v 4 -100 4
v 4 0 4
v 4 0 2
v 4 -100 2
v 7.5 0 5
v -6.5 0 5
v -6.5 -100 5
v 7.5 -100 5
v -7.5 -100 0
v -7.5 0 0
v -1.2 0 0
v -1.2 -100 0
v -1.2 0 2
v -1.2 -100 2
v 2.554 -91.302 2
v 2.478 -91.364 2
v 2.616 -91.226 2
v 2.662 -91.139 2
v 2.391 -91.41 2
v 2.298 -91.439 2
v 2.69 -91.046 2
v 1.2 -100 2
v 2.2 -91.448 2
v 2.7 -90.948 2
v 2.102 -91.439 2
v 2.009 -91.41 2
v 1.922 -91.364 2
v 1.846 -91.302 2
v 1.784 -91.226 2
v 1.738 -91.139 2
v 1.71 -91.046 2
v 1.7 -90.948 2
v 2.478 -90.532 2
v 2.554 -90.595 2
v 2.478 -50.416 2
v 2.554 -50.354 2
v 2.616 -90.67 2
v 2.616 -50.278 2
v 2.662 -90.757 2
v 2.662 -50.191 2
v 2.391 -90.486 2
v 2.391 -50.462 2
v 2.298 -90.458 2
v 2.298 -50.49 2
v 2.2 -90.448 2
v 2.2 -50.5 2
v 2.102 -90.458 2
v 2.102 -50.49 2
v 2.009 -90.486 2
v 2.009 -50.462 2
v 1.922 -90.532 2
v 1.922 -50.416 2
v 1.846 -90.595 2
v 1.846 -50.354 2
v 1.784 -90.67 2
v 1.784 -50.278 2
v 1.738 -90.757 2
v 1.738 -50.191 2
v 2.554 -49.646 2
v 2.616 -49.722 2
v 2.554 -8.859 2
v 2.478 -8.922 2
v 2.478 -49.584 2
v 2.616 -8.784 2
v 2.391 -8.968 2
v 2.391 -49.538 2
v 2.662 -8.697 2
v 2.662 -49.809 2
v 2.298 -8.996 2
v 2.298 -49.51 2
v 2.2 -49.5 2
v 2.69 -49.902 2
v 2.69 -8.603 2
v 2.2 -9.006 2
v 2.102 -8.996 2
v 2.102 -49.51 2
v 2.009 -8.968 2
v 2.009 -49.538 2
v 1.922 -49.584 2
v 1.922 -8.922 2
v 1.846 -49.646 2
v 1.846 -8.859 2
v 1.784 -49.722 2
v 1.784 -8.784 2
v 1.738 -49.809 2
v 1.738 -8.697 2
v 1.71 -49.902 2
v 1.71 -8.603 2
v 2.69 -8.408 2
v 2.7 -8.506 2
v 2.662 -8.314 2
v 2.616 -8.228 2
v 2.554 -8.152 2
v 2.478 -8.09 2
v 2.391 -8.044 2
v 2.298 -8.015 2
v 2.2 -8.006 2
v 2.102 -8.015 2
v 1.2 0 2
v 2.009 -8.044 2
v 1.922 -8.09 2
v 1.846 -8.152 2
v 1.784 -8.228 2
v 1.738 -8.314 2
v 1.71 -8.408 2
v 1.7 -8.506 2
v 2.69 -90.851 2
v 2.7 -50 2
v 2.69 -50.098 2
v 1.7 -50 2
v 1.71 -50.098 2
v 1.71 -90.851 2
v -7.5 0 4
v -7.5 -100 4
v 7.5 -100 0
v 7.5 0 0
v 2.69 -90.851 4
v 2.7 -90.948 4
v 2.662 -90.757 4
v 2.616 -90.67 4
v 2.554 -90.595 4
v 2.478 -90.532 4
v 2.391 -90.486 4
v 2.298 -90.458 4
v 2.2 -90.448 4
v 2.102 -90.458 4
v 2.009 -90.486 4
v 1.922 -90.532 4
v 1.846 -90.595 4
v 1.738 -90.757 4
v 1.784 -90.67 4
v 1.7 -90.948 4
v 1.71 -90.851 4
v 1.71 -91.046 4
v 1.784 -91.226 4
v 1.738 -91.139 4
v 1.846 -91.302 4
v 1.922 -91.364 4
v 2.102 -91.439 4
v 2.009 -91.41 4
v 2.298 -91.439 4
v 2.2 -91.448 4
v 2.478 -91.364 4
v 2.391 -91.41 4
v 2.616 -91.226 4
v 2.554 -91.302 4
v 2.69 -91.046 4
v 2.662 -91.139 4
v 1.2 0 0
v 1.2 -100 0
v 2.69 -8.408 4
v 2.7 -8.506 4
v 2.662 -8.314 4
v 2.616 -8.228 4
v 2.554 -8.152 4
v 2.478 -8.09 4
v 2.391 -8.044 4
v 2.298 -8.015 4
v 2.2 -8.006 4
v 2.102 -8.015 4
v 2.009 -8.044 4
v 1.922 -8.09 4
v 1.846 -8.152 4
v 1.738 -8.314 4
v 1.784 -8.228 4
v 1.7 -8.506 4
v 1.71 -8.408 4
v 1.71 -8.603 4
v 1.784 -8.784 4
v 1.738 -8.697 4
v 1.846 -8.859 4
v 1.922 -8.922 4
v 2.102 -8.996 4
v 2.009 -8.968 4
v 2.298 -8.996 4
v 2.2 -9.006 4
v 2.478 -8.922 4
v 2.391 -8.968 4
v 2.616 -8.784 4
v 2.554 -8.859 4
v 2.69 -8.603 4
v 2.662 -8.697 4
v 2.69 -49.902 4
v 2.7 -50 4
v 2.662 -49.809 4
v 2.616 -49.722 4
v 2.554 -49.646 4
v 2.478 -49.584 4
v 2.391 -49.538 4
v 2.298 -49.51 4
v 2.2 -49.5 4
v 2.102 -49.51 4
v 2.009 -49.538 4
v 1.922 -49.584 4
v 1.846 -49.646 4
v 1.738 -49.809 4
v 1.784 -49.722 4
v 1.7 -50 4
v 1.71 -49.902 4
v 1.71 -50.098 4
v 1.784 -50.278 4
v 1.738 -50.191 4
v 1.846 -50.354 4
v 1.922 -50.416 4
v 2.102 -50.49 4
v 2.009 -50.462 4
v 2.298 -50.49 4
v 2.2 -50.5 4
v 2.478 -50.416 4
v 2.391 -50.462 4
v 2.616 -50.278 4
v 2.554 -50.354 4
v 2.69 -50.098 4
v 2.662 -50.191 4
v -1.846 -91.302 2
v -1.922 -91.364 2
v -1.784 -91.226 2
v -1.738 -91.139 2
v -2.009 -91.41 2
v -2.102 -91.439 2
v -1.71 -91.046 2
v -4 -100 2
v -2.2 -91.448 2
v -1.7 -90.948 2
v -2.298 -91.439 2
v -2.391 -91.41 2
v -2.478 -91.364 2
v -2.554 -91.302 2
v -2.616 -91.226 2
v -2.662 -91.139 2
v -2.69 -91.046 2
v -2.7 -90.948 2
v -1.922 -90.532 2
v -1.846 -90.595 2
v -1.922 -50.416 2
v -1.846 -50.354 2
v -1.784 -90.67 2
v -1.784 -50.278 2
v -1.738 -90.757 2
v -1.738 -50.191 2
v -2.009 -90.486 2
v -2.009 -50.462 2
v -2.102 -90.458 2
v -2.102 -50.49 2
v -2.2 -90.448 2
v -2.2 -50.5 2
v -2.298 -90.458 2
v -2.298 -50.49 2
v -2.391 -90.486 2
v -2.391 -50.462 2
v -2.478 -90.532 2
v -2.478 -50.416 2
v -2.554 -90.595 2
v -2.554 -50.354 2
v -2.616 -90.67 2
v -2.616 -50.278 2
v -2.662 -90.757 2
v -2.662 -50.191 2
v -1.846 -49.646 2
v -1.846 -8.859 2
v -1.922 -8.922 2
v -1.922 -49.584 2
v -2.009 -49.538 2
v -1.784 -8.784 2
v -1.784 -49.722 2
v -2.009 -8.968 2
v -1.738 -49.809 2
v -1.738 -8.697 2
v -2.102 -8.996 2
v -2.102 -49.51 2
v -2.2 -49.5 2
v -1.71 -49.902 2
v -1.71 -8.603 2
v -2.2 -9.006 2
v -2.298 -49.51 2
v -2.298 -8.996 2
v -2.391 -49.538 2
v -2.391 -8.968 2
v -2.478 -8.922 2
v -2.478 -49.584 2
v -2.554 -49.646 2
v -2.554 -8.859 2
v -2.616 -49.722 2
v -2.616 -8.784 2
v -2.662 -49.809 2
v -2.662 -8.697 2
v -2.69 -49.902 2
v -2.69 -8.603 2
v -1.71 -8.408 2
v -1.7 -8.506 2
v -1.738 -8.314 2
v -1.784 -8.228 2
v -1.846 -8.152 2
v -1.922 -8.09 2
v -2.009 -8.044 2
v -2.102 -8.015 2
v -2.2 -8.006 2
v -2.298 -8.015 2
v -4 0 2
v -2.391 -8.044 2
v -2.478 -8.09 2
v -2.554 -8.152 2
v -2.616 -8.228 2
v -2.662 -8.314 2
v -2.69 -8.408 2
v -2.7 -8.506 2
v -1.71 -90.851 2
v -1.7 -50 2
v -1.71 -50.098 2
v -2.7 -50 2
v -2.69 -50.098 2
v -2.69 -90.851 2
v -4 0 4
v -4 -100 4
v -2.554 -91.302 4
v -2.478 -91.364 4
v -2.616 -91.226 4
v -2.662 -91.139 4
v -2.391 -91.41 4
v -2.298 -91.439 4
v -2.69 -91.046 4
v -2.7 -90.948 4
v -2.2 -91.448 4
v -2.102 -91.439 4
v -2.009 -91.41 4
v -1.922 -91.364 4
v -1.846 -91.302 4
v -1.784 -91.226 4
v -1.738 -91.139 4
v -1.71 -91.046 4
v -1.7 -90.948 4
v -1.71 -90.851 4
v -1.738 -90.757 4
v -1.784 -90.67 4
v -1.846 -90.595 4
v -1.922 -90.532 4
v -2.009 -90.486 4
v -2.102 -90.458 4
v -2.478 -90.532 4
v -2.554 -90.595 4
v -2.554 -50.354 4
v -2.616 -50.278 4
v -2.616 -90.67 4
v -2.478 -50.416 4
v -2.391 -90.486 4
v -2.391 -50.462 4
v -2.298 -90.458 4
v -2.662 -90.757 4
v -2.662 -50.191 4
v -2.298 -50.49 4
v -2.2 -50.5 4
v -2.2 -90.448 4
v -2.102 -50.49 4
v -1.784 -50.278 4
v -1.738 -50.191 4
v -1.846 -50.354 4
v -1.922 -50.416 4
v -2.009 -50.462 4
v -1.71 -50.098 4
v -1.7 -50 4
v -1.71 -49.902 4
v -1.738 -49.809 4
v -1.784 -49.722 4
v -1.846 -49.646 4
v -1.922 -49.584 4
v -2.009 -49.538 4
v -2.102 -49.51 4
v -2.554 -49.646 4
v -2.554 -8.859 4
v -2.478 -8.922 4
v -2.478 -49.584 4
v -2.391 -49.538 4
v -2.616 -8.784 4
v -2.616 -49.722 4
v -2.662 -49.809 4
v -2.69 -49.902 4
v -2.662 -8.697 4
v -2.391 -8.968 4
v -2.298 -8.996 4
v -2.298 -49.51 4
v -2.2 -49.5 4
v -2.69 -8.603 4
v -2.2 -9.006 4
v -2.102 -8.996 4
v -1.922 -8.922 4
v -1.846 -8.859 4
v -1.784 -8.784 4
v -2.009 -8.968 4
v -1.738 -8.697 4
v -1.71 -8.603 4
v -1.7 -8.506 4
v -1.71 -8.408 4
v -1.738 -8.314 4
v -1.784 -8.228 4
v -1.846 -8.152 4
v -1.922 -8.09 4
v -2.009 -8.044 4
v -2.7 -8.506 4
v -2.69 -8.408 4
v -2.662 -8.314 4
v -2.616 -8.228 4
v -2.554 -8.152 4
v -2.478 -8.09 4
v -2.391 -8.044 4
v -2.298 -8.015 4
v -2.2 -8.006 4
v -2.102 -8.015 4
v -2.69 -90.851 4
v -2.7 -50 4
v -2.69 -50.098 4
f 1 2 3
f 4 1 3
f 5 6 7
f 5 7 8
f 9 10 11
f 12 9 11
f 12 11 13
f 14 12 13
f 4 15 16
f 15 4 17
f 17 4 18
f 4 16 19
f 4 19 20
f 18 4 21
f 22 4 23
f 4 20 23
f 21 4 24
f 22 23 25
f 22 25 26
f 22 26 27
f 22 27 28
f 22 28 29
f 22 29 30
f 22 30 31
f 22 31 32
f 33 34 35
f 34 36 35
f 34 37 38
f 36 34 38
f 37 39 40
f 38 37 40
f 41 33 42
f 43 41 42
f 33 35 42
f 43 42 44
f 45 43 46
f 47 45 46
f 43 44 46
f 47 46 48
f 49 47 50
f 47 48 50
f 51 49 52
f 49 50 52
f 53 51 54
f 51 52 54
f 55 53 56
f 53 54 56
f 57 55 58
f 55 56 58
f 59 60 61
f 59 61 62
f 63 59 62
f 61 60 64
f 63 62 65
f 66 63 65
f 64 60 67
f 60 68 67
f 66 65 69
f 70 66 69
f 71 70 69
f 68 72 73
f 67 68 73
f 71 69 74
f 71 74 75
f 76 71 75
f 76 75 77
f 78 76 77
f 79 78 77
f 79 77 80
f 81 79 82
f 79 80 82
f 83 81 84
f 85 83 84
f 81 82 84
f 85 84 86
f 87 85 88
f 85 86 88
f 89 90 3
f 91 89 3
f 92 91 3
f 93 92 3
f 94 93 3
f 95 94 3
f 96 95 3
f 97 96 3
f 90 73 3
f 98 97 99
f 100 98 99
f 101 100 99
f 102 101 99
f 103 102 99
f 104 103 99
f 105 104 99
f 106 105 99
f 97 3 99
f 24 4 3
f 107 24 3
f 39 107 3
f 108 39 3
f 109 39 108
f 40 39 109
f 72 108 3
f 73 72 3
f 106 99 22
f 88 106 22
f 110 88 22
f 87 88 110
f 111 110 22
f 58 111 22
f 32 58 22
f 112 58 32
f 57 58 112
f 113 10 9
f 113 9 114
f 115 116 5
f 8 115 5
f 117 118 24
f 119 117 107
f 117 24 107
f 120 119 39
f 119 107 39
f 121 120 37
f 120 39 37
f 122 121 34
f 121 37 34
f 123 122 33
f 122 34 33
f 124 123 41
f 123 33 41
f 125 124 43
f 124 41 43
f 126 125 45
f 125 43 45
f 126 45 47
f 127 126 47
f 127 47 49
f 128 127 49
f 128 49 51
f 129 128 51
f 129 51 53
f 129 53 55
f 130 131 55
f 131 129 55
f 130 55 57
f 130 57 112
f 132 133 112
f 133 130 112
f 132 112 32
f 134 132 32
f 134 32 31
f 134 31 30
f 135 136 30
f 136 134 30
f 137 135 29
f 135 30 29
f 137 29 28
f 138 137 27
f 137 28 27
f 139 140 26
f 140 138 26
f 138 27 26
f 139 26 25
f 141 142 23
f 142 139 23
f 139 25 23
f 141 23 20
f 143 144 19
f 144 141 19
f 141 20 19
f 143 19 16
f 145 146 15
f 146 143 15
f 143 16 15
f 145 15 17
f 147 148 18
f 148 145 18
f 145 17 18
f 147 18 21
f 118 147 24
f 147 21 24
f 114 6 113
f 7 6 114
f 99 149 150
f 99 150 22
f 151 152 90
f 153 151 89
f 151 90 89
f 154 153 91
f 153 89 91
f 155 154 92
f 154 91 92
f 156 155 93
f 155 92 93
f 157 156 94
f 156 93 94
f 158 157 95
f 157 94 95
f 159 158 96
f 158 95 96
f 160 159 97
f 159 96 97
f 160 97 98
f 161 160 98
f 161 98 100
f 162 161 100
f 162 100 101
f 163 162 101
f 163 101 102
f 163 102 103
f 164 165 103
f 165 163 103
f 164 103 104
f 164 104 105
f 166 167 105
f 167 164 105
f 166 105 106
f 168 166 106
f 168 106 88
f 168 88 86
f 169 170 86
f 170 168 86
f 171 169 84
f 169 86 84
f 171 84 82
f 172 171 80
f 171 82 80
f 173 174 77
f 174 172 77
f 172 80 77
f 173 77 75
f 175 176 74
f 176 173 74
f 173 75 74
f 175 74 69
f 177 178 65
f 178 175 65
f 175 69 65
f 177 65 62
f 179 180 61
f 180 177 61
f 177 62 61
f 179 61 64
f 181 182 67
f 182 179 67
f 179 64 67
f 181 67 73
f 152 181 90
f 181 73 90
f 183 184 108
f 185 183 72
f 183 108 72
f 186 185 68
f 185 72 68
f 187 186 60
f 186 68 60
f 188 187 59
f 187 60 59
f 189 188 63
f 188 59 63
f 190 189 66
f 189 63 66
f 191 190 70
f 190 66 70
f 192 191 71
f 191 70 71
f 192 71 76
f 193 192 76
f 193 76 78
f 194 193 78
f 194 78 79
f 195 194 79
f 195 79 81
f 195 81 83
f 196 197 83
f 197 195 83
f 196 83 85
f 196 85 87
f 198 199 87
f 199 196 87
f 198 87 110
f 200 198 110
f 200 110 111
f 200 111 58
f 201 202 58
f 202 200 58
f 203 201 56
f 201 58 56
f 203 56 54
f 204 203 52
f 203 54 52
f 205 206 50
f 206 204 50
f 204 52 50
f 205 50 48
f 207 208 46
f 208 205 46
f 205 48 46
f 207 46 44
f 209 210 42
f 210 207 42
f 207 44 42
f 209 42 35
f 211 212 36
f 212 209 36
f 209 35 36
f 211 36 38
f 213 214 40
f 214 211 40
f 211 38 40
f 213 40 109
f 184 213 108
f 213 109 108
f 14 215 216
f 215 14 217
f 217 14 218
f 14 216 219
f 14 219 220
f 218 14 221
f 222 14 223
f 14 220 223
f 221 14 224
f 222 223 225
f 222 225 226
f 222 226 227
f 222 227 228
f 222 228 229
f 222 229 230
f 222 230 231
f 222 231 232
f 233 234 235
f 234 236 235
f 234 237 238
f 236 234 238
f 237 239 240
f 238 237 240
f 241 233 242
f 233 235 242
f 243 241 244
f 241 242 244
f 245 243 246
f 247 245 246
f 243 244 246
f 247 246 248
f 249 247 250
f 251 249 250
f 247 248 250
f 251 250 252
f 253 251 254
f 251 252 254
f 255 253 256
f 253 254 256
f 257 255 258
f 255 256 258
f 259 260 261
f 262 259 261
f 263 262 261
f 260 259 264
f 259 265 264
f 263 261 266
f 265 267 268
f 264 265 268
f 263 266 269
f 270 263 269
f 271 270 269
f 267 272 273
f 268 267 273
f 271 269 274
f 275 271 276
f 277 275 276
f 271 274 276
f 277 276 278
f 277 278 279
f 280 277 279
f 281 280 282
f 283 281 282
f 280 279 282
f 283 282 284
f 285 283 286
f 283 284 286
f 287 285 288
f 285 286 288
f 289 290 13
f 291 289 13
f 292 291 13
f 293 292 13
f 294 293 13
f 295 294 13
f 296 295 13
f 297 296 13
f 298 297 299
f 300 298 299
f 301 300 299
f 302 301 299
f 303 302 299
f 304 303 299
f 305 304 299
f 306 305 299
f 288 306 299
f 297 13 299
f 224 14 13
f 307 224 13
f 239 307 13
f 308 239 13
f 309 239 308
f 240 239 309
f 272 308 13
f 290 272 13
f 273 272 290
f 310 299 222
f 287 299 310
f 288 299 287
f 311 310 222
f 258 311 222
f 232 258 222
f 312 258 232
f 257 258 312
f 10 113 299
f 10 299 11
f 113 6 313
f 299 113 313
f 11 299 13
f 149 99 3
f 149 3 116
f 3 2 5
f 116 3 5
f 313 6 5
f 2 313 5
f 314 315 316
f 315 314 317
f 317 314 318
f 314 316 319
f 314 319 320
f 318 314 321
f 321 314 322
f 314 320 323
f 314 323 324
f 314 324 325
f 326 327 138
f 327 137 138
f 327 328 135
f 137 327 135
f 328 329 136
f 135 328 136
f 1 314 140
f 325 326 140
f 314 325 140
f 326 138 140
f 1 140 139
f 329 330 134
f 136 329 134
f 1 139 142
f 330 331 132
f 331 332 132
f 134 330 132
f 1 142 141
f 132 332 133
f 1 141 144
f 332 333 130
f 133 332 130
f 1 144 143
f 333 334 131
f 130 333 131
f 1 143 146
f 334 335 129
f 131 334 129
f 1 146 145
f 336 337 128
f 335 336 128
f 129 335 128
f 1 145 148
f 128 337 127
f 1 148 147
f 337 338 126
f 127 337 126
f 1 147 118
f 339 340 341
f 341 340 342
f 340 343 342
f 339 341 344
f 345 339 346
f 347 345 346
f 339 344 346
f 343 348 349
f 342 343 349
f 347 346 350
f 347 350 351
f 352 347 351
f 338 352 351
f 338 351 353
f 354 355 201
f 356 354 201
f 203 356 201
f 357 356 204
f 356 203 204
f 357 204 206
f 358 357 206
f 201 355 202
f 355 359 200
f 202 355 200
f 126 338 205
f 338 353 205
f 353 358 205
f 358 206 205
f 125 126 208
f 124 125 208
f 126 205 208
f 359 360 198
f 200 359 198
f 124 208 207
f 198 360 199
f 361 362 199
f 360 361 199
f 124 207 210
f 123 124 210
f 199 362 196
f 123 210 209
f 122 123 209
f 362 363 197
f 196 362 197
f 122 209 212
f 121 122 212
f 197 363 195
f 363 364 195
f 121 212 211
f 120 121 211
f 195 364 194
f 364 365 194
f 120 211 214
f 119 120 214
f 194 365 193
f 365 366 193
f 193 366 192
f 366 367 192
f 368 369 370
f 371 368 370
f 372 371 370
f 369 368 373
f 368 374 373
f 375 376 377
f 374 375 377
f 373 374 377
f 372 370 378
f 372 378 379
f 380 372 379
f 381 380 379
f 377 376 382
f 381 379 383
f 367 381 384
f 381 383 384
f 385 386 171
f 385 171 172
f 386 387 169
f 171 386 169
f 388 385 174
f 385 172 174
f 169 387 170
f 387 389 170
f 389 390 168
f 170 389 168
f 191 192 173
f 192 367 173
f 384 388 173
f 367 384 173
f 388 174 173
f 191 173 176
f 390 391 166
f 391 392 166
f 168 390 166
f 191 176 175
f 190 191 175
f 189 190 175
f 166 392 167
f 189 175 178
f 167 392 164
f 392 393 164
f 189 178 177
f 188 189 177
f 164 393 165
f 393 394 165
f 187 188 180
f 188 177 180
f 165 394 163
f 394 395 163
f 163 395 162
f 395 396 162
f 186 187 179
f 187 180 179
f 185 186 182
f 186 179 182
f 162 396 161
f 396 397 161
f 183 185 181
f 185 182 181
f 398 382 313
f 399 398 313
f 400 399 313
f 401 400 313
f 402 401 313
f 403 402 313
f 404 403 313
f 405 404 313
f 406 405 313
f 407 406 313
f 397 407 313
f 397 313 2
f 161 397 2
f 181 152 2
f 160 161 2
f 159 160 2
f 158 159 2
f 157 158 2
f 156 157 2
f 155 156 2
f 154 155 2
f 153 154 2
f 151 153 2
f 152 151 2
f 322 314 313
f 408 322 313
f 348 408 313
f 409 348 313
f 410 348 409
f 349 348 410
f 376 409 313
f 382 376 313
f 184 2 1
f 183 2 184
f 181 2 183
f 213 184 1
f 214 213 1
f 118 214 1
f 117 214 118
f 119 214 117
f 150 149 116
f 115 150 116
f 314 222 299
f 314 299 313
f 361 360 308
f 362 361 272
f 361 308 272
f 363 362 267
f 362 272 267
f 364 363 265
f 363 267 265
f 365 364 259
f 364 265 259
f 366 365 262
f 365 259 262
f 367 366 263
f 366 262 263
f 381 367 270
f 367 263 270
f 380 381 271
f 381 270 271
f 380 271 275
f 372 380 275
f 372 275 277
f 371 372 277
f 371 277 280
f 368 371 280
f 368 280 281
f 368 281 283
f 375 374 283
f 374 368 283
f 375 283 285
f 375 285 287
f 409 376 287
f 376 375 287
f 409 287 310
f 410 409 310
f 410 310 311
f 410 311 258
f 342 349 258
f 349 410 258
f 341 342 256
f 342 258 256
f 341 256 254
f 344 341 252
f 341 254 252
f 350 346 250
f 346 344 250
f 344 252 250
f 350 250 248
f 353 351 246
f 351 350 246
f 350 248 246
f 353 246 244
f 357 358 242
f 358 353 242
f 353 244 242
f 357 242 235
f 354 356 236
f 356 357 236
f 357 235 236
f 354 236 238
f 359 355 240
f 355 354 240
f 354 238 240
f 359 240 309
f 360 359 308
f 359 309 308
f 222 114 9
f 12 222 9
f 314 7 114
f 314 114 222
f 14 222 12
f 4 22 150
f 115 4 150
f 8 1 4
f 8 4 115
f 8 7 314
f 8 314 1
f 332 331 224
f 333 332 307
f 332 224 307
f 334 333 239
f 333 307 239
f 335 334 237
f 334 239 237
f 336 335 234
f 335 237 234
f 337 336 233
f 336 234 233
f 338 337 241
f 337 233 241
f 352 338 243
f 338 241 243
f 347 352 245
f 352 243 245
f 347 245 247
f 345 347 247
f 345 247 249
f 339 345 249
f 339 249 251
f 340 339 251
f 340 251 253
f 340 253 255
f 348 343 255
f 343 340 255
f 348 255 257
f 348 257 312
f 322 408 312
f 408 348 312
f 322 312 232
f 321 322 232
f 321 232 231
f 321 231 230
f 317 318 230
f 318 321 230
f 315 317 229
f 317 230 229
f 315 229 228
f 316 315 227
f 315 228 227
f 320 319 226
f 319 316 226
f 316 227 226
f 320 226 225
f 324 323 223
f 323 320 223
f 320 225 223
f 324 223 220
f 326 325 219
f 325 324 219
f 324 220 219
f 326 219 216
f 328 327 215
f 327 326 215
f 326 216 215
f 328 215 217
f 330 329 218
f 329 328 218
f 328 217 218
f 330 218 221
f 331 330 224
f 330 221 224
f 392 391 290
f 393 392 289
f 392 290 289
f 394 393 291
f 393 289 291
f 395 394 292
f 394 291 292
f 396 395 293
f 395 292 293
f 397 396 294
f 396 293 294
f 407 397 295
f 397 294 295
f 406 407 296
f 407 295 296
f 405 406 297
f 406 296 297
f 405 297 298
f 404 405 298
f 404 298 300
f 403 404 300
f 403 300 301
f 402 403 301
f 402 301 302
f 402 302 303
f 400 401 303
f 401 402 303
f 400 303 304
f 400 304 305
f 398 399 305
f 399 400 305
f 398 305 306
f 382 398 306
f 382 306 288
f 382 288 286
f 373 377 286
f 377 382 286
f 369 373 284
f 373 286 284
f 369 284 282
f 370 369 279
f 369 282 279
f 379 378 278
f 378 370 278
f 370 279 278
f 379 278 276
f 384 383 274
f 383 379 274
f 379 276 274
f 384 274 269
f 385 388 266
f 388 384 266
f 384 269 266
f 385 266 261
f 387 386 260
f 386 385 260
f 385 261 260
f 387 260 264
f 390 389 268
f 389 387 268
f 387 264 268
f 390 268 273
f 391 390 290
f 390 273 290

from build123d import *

# Parameters (mm, degrees)
F0_W     = 15
F0_H     = 5
F1_DEPTH = 100
F2_W     = 1.2
F2_H     = 2
F3_DEPTH = 113.7
F4_R     = 0.5
F5_DEPTH = 2.87
F6_SIZE  = 1


with BuildPart() as f1:
    # F0 (on Front) → F1 (new body)
    with BuildSketch(Plane.XZ):
        with Locations((0, 2.5)):
            Rectangle(F0_W, F0_H)
    extrude(amount=F1_DEPTH)

    # F2 (on face) → F3 (cut)
    with BuildSketch(Plane(origin=(0, 0, 0), x_dir=(-1, 0, 0), z_dir=(0, 1, 0))):
        Polygon((-4, 2), (-1.2, 2), (0, 2), (0, 4), (-4, 4), align=None)
        with Locations((-0.6, 1)):
            Rectangle(F2_W, F2_H)
        with Locations((0.6, 1)):
            Rectangle(F2_W, F2_H)
        Polygon((0, 4), (0, 2), (1.2, 2), (4, 2), (4, 4), align=None)
    extrude(amount=-F3_DEPTH, mode=Mode.SUBTRACT)

    # F4 (on face) → F5 (join)
    with BuildSketch(Plane.XY.offset(2)):
        with Locations((-2.2, -8.50577)):
            Circle(F4_R)
        with Locations((-2.2, -50)):
            Circle(F4_R)
        with Locations((-2.2, -90.948157)):
            Circle(F4_R)
        with Locations((2.2, -90.948157)):
            Circle(F4_R)
        with Locations((2.2, -50)):
            Circle(F4_R)
        with Locations((2.2, -8.50577)):
            Circle(F4_R)
    extrude(amount=F5_DEPTH)

    # F6
    f6_edges = [f1.edges().sort_by_distance(p)[0] for p in [
        (-7.5, -50, 5),
    ]]
    chamfer(f6_edges, length=F6_SIZE)


solid = f1.part
